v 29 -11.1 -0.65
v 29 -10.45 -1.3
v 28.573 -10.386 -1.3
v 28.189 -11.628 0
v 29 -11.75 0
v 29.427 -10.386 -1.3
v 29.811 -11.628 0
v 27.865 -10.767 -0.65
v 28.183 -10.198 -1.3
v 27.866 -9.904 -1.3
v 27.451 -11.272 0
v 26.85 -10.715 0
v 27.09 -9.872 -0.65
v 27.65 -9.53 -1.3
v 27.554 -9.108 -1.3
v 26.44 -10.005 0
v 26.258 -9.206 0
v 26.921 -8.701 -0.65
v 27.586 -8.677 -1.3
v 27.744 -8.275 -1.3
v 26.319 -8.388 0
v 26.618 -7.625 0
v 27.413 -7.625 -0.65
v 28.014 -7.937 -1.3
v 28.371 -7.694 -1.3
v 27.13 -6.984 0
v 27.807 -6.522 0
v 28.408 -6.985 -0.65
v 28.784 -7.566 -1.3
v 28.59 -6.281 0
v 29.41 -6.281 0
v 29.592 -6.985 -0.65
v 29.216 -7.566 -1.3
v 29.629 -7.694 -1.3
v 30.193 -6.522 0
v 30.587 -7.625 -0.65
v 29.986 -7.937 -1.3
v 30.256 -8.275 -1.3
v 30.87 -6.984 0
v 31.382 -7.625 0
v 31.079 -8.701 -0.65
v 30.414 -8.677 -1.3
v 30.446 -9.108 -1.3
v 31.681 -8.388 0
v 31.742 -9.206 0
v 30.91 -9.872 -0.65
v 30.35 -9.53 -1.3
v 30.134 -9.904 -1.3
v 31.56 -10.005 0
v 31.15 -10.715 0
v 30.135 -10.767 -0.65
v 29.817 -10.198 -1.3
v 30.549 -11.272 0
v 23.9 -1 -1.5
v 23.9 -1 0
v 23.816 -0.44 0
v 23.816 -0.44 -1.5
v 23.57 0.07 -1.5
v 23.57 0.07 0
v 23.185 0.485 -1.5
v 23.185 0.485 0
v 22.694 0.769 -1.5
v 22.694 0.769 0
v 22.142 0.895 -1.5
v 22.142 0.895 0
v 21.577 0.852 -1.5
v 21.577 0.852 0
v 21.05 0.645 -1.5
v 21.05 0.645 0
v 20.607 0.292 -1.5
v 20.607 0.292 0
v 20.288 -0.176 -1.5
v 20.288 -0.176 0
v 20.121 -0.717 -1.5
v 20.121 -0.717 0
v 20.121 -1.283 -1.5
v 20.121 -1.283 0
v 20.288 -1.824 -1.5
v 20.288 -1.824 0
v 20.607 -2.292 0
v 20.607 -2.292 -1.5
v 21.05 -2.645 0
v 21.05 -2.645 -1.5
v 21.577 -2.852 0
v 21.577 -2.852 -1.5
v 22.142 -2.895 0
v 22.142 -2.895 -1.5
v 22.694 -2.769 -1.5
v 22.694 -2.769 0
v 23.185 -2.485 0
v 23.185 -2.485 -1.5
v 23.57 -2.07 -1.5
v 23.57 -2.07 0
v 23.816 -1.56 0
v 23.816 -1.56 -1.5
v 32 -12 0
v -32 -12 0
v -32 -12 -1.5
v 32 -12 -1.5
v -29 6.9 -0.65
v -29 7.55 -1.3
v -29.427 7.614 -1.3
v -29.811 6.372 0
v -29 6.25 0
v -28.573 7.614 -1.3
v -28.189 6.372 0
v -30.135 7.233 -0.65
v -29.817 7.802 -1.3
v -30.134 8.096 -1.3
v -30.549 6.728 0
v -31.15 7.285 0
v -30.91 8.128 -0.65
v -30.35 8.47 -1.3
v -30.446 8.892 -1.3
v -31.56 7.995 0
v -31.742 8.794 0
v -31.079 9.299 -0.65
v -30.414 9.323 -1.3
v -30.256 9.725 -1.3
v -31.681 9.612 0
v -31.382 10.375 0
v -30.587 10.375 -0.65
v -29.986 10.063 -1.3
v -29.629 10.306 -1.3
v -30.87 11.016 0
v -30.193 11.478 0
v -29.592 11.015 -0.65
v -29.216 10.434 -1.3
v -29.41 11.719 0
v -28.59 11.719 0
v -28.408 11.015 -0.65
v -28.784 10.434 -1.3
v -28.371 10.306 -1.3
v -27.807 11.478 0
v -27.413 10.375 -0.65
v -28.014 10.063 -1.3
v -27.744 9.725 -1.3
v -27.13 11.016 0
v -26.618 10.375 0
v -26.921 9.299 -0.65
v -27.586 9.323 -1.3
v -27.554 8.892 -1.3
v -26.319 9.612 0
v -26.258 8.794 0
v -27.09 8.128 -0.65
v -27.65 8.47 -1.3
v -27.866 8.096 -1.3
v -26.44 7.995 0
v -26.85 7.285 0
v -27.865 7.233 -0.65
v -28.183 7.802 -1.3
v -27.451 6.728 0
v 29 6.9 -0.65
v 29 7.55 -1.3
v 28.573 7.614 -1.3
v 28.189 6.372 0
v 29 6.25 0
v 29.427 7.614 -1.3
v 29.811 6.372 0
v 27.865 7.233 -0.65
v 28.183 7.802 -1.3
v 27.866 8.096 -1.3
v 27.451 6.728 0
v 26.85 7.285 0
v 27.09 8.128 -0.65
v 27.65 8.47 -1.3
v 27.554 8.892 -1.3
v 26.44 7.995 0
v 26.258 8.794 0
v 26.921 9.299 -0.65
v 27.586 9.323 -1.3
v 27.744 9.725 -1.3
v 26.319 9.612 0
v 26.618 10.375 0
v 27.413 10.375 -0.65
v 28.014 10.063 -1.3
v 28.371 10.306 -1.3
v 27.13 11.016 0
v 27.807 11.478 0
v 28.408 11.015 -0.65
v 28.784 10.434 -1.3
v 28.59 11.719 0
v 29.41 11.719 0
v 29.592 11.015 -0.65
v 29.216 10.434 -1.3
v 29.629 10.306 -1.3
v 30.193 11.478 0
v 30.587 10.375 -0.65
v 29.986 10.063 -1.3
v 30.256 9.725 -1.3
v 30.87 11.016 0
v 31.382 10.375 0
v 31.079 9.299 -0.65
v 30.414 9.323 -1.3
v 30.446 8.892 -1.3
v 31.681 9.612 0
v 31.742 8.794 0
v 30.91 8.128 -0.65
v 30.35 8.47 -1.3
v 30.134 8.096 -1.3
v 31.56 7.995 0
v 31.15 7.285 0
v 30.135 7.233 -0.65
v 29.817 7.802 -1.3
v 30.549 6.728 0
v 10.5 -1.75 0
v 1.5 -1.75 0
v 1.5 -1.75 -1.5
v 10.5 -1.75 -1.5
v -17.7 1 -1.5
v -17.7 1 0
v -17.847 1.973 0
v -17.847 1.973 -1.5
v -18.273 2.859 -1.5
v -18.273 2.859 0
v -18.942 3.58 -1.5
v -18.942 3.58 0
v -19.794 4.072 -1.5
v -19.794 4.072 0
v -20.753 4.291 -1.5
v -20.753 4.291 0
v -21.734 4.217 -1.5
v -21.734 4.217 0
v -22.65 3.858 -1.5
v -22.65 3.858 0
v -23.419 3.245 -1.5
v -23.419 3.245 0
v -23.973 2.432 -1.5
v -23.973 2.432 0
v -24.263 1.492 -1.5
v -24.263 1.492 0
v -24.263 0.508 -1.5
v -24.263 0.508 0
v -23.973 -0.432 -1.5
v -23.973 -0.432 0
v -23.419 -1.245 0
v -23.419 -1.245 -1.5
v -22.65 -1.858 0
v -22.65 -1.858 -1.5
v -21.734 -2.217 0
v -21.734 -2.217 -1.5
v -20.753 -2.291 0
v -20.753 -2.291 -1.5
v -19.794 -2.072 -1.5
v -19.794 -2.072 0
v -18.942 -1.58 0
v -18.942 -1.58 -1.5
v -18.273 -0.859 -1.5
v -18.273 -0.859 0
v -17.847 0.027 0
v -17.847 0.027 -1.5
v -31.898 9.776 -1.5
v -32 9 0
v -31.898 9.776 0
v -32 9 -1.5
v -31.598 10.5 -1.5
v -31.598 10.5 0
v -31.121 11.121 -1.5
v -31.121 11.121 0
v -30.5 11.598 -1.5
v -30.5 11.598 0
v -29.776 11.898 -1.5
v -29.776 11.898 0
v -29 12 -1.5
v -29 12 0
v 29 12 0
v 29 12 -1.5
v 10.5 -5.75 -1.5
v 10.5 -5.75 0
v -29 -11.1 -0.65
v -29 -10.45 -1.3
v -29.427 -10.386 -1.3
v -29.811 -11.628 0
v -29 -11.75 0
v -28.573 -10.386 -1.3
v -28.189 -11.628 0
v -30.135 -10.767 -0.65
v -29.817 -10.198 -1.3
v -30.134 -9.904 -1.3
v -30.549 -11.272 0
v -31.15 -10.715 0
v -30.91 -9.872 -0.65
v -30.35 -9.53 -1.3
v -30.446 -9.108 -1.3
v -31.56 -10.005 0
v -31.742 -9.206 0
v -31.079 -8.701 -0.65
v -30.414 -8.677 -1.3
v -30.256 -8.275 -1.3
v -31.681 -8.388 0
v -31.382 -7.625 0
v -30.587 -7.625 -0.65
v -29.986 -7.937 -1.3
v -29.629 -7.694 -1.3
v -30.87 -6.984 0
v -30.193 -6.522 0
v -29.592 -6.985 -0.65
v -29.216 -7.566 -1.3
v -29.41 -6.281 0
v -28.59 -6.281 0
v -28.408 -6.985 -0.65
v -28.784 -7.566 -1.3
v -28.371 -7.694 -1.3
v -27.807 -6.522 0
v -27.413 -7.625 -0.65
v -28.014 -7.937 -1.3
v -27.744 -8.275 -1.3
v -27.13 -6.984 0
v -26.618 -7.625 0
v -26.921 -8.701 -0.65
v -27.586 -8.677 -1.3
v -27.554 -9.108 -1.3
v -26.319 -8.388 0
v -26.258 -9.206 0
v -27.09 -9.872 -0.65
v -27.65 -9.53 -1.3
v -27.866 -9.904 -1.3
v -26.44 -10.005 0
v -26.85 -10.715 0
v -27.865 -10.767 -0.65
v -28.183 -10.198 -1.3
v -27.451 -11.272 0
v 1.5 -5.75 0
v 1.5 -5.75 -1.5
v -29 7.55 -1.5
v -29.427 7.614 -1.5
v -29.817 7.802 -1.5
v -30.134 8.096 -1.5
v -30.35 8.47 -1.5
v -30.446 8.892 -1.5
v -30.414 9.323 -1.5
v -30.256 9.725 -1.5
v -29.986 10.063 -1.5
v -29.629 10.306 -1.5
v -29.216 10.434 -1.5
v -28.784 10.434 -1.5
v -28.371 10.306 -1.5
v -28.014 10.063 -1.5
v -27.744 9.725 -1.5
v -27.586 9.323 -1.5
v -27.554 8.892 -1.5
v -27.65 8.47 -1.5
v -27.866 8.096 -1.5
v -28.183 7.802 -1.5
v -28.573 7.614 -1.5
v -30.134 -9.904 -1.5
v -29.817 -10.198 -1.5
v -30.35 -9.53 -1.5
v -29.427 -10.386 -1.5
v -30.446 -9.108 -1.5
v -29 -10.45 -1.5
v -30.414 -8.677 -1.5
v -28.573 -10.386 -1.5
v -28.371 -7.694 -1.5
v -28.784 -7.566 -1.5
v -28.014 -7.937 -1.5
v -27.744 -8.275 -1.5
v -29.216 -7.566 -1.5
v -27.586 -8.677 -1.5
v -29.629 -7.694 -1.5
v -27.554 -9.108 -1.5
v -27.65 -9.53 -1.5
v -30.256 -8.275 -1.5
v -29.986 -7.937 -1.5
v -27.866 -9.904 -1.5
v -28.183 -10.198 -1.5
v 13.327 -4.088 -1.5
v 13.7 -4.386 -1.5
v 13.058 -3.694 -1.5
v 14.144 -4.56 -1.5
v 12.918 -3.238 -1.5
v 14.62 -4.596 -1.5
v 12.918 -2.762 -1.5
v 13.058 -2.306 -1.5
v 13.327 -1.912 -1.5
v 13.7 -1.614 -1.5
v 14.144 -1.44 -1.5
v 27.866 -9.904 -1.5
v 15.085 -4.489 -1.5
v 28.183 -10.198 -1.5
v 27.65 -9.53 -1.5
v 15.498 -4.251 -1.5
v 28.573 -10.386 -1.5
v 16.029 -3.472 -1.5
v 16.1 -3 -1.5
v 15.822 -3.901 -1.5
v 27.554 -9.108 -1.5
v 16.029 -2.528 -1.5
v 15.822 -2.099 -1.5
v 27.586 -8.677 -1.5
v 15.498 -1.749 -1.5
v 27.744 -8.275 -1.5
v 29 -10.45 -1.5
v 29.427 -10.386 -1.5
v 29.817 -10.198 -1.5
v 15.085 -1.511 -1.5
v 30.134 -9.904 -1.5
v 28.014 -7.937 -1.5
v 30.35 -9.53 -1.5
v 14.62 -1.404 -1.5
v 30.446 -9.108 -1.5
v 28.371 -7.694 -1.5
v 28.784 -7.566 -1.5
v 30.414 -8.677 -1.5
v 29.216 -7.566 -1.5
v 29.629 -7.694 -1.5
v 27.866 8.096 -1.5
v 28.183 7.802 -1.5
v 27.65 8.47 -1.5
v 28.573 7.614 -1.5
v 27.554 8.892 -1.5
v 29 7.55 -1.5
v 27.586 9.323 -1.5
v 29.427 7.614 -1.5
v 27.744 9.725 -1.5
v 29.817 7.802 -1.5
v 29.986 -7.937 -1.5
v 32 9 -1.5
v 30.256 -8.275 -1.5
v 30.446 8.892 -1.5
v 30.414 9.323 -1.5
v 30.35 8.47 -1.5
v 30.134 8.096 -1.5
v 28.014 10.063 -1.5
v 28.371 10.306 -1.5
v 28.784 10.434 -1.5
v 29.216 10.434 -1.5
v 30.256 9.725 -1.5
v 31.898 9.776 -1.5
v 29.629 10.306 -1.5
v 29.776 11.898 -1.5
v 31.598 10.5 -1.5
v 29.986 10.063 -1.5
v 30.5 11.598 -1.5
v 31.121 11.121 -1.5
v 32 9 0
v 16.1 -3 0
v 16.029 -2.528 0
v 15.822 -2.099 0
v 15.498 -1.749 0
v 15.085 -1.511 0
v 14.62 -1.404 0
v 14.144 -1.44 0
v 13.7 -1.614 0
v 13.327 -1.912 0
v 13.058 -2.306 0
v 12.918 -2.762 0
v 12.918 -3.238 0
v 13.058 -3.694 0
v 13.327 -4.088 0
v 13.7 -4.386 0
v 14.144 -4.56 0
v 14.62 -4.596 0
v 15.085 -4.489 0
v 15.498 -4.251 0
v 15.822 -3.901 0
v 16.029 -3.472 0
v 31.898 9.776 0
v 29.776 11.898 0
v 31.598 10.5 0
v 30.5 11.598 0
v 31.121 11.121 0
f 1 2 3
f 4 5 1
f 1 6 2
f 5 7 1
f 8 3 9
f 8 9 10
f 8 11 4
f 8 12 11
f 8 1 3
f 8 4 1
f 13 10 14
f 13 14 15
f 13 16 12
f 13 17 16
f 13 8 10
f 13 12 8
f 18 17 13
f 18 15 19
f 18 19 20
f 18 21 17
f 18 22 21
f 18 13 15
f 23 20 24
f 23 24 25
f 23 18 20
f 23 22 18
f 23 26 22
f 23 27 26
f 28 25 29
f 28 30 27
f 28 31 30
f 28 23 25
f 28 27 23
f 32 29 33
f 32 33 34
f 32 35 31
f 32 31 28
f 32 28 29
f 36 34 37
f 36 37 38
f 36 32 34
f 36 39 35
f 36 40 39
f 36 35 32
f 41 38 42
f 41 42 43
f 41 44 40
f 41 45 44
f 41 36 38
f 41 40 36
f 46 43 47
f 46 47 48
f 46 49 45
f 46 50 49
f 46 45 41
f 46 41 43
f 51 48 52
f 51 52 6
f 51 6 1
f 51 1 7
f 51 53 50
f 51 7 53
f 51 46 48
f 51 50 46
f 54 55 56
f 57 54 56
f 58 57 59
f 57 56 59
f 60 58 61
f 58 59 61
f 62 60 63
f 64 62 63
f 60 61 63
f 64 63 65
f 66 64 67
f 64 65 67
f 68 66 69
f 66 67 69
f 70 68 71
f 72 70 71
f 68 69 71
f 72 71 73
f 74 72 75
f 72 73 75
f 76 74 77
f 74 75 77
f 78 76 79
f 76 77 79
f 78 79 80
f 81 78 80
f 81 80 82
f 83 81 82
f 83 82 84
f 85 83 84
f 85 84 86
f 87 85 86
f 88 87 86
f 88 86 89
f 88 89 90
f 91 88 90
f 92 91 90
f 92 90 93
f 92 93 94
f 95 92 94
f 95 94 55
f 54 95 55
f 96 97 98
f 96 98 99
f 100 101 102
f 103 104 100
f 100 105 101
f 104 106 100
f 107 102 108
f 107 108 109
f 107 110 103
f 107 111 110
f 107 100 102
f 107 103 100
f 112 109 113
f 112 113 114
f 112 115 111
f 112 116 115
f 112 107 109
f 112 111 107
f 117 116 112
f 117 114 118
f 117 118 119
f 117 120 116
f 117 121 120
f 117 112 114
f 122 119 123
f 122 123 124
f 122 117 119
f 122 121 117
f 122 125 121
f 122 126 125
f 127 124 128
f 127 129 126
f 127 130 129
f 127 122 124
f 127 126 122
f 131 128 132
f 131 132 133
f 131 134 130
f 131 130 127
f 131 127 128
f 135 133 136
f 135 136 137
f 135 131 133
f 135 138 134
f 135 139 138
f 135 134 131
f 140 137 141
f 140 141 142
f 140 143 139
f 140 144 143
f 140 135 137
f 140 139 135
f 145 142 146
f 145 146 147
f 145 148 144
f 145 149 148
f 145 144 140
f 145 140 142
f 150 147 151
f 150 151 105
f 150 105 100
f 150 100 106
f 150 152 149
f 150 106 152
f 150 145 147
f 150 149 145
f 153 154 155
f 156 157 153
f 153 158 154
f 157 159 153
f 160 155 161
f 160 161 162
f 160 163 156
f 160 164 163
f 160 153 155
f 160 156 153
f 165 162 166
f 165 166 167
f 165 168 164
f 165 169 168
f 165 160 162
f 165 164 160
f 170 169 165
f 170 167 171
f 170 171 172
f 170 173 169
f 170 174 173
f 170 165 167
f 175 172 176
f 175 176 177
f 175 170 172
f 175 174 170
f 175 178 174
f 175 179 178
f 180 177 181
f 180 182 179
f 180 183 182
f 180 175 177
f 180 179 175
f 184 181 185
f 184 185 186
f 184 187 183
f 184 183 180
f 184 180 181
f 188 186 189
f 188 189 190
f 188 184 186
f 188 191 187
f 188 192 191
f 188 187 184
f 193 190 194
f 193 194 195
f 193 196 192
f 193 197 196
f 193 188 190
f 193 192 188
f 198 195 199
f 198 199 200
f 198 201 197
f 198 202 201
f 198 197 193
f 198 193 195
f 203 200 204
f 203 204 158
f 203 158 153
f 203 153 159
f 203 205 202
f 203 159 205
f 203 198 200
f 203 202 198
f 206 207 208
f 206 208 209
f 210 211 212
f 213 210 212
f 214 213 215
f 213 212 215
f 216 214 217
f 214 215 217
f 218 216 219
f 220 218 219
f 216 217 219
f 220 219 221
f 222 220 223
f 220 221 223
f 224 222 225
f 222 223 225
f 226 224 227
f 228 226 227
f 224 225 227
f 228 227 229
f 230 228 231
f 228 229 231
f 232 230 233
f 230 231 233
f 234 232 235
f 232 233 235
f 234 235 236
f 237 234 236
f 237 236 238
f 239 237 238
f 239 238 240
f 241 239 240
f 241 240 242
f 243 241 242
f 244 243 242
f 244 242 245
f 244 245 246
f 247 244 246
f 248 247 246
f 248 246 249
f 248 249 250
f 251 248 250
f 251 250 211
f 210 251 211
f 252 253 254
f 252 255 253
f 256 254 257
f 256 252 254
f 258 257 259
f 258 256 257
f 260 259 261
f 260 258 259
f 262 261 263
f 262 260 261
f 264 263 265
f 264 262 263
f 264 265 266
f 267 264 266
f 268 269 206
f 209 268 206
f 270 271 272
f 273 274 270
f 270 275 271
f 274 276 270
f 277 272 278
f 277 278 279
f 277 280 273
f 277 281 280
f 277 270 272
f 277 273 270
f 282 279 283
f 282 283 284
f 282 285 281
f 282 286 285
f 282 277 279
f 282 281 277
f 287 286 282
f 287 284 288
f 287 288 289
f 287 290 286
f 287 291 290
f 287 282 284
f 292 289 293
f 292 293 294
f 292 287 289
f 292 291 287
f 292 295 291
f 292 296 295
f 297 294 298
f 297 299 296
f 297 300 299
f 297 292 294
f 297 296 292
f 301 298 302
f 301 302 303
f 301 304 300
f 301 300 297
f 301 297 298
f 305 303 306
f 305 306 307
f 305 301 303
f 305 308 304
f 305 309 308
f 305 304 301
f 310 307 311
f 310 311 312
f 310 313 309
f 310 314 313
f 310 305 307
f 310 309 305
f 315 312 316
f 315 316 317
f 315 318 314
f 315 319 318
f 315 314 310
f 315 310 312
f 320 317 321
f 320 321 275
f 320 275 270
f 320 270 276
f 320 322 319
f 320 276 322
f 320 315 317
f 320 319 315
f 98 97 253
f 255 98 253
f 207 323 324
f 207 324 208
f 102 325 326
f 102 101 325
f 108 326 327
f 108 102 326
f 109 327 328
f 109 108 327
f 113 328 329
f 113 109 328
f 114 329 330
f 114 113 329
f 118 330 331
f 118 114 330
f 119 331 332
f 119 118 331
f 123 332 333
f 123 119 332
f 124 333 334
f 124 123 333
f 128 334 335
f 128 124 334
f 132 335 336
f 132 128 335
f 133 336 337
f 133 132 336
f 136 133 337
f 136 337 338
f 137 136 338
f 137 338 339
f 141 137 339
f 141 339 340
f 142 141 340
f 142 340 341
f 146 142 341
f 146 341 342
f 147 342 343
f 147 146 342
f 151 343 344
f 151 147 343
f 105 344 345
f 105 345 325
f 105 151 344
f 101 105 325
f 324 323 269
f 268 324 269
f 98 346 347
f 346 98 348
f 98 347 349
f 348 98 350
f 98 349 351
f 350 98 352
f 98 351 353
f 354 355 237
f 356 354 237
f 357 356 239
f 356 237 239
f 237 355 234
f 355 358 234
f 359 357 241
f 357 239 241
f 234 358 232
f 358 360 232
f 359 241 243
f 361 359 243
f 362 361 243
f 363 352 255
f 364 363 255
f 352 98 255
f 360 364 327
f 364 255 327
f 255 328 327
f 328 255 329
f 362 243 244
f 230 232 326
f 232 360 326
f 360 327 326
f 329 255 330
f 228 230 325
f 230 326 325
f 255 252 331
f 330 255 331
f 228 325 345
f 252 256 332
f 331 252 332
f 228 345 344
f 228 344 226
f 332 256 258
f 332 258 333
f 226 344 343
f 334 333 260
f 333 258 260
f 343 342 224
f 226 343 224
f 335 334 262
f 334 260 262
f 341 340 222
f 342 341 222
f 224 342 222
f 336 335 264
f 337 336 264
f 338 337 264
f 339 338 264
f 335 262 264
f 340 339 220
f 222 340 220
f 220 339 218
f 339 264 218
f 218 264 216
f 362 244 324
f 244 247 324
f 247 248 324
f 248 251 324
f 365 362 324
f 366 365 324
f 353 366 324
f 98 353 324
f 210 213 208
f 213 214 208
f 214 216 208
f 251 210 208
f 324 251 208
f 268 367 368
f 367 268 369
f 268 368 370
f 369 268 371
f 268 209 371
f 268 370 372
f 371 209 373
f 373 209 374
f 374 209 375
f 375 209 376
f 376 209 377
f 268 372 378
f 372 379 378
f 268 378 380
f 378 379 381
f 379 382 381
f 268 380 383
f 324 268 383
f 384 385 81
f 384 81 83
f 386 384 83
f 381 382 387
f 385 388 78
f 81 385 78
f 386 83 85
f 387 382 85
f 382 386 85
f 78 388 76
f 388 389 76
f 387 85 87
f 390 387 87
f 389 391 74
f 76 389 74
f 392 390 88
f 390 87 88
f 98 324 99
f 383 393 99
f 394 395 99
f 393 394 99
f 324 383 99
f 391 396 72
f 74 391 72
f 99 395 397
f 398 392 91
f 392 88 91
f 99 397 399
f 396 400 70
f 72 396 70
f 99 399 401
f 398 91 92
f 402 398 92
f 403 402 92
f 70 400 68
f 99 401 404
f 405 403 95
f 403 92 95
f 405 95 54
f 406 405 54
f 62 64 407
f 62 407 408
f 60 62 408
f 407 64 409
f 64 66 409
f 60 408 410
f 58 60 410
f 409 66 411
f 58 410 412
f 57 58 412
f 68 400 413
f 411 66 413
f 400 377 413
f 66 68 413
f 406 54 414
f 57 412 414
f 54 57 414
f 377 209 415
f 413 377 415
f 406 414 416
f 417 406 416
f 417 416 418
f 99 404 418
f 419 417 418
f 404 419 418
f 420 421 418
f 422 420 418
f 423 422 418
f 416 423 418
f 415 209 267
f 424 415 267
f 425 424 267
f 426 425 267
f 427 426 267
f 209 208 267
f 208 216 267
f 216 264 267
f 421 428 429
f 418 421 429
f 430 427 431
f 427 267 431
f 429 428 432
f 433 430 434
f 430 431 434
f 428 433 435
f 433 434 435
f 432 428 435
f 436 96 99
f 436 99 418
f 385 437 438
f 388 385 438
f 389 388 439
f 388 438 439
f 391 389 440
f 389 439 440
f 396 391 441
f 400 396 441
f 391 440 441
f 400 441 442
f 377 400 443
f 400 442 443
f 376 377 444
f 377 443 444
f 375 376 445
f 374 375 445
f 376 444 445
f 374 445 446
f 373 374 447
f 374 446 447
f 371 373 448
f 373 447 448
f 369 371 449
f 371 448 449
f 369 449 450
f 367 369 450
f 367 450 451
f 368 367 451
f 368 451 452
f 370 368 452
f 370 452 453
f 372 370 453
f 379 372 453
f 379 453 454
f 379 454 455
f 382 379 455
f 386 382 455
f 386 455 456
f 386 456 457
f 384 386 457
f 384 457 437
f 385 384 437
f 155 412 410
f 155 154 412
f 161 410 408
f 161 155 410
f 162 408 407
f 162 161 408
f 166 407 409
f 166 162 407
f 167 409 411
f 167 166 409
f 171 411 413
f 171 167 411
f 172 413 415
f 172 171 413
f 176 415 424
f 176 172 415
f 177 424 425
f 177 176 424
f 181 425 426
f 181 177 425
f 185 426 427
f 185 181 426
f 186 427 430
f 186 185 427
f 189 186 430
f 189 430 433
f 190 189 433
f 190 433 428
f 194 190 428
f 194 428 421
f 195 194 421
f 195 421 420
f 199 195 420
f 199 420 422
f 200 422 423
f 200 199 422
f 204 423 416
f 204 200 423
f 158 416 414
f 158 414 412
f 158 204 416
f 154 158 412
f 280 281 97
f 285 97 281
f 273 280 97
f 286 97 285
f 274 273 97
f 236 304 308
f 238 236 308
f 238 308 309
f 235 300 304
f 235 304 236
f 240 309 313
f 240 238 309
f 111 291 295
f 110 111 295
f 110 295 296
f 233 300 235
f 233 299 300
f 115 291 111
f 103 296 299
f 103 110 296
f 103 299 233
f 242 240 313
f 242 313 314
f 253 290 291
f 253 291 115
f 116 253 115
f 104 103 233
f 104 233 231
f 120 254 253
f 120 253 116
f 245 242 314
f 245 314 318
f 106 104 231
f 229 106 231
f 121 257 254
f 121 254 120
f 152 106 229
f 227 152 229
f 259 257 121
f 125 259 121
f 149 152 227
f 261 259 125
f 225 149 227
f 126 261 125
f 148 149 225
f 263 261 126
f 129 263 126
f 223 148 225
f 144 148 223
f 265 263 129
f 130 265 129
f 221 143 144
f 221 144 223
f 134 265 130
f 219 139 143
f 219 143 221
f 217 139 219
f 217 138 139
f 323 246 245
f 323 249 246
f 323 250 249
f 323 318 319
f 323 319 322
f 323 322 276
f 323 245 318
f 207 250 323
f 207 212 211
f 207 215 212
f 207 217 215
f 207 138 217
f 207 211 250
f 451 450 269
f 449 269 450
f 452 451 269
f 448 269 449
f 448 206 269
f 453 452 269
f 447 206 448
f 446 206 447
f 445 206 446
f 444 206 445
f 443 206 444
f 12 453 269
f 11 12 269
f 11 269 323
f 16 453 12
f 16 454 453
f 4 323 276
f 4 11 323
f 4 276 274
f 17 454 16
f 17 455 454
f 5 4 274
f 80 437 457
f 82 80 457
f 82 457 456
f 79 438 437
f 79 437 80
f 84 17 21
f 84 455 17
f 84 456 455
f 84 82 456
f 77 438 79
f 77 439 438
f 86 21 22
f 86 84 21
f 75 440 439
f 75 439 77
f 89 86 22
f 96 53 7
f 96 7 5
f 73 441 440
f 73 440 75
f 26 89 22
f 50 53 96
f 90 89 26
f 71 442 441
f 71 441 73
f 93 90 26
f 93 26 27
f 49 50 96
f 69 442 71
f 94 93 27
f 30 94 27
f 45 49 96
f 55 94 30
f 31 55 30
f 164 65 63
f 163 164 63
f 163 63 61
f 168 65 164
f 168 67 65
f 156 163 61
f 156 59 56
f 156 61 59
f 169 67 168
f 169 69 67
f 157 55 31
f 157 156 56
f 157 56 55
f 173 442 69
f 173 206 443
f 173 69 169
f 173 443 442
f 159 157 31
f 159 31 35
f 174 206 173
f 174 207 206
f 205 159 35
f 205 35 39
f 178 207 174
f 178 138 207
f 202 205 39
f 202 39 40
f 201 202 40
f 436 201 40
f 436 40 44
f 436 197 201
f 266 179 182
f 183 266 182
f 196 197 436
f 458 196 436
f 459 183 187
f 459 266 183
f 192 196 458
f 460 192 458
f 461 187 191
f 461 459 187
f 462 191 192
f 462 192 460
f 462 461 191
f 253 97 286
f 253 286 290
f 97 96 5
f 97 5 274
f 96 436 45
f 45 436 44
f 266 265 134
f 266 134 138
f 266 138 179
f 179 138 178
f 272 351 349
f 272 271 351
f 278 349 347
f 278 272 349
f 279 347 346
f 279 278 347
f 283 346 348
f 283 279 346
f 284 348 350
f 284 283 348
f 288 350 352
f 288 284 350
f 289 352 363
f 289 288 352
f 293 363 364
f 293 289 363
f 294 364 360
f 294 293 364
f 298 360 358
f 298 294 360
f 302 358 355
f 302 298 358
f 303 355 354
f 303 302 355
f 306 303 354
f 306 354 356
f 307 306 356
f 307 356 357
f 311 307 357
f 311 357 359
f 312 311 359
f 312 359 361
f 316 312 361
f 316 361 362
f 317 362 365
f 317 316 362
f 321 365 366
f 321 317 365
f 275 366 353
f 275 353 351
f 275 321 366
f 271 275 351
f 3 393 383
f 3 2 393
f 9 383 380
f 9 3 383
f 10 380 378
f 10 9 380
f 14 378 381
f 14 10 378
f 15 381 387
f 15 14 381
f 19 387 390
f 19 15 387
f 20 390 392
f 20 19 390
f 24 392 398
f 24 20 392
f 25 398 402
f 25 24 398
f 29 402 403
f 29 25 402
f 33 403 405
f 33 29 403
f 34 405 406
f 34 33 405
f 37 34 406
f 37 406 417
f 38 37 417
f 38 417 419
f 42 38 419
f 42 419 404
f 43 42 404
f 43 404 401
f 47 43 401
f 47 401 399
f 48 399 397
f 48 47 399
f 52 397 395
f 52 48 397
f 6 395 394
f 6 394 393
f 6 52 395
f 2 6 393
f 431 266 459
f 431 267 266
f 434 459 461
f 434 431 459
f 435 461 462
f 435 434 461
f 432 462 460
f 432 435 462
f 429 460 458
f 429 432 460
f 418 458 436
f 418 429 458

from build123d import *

# Parameters (mm, degrees)
SKETCH1_W                                      = 64
SKETCH1_H                                      = 24
BOSS_EXTRUDE1_DEPTH                            = 1.5
CSK_FOR_M2_5_FLAT_HEAD_MACHINE_SCREW1_AT_COUNT = 2
CSK_FOR_M2_5_FLAT_HEAD_MACHINE_SCREW1_AT_PITCH = 58
CSK_FOR_M2_5_FLAT_HEAD_MACHINE_SCREW_2_COUNT   = 2
CSK_FOR_M2_5_FLAT_HEAD_MACHINE_SCREW_2_PITCH   = 18
CSK_FOR_M2_5_FLAT_HEAD_MACHINE_SCREW_3_COUNT   = 2
CSK_FOR_M2_5_FLAT_HEAD_MACHINE_SCREW_3_PITCH   = 60.728905803
FILLET1_R                                      = 3
SKETCH4_R                                      = 3.3
CUT_EXTRUDE1_DEPTH                             = 35.208916966
SKETCH5_R                                      = 1.6
CUT_EXTRUDE2_DEPTH                             = 35.208916966
SKETCH6_R                                      = 1.9
CUT_EXTRUDE3_DEPTH                             = 35.208916966
SKETCH7_W                                      = 9
SKETCH7_H                                      = 4
CUT_EXTRUDE4_DEPTH                             = 35.208916966


with BuildPart() as part:
    # Sketch1 → Boss-Extrude1 (new body)
    with BuildSketch(Plane.XY):
        Rectangle(SKETCH1_W, SKETCH1_H)
    extrude(amount=-BOSS_EXTRUDE1_DEPTH)

    # Sketch2 → CSK for M2.5 Flat Head Machine Screw1 (revolve, cut)
    with BuildSketch(Plane(origin=(-29, 9, 0), x_dir=(0, -1, 0), z_dir=(1, 0, 0))):
        Polygon((0, 0), (0, 1.5), (1.45, 1.5), (1.45, 1.3), (2.75, 0), align=None)
    csk_for_m2_5_flat_head_machine_screw1 = revolve(axis=Axis((-29, 9, 6.35), (0, 0, -1)), mode=Mode.SUBTRACT)

    # CSK for M2.5 Flat Head Machine Screw1 at: CSK for M2.5 Flat Head Machine Screw1 ×2
    with Locations(*[(i * CSK_FOR_M2_5_FLAT_HEAD_MACHINE_SCREW1_AT_PITCH, 0, 0) for i in range(1, CSK_FOR_M2_5_FLAT_HEAD_MACHINE_SCREW1_AT_COUNT)]):
        add(csk_for_m2_5_flat_head_machine_screw1, mode=Mode.SUBTRACT)

    # CSK for M2.5 Flat Head Machine Screw 2: CSK for M2.5 Flat Head Machine Screw1 ×2
    with Locations(*[(0, -i * CSK_FOR_M2_5_FLAT_HEAD_MACHINE_SCREW_2_PITCH, 0) for i in range(1, CSK_FOR_M2_5_FLAT_HEAD_MACHINE_SCREW_2_COUNT)]):
        add(csk_for_m2_5_flat_head_machine_screw1, mode=Mode.SUBTRACT)

    # CSK for M2.5 Flat Head Machine Screw 3: CSK for M2.5 Flat Head Machine Screw1 ×2
    with Locations(*[Vector(0.9550641368112371, -0.2963992148724529, 0) * (i * CSK_FOR_M2_5_FLAT_HEAD_MACHINE_SCREW_3_PITCH) for i in range(1, CSK_FOR_M2_5_FLAT_HEAD_MACHINE_SCREW_3_COUNT)]):
        add(csk_for_m2_5_flat_head_machine_screw1, mode=Mode.SUBTRACT)

    # Fillet1
    fillet1_edges = [part.edges().sort_by_distance(p)[0] for p in [
        (-32, 12, -0.75),
        (32, 12, -0.75),
    ]]
    fillet(fillet1_edges, radius=FILLET1_R)

    # Sketch4 → Cut-Extrude1 (cut, through all)
    with BuildSketch(Plane.XY):
        with Locations((-21, 1)):
            Circle(SKETCH4_R)
    extrude(amount=-CUT_EXTRUDE1_DEPTH, mode=Mode.SUBTRACT)

    # Sketch5 → Cut-Extrude2 (cut, through all)
    with BuildSketch(Plane.XY):
        with Locations((14.5, -3)):
            Circle(SKETCH5_R)
    extrude(amount=-CUT_EXTRUDE2_DEPTH, mode=Mode.SUBTRACT)

    # Sketch6 → Cut-Extrude3 (cut, through all)
    with BuildSketch(Plane.XY):
        with Locations((22, -1)):
            Circle(SKETCH6_R)
    extrude(amount=-CUT_EXTRUDE3_DEPTH, mode=Mode.SUBTRACT)

    # Sketch7 → Cut-Extrude4 (cut, through all)
    with BuildSketch(Plane.XY):
        with Locations((6, -3.75)):
            Rectangle(SKETCH7_W, SKETCH7_H)
    extrude(amount=-CUT_EXTRUDE4_DEPTH, mode=Mode.SUBTRACT)


solid = part.part
